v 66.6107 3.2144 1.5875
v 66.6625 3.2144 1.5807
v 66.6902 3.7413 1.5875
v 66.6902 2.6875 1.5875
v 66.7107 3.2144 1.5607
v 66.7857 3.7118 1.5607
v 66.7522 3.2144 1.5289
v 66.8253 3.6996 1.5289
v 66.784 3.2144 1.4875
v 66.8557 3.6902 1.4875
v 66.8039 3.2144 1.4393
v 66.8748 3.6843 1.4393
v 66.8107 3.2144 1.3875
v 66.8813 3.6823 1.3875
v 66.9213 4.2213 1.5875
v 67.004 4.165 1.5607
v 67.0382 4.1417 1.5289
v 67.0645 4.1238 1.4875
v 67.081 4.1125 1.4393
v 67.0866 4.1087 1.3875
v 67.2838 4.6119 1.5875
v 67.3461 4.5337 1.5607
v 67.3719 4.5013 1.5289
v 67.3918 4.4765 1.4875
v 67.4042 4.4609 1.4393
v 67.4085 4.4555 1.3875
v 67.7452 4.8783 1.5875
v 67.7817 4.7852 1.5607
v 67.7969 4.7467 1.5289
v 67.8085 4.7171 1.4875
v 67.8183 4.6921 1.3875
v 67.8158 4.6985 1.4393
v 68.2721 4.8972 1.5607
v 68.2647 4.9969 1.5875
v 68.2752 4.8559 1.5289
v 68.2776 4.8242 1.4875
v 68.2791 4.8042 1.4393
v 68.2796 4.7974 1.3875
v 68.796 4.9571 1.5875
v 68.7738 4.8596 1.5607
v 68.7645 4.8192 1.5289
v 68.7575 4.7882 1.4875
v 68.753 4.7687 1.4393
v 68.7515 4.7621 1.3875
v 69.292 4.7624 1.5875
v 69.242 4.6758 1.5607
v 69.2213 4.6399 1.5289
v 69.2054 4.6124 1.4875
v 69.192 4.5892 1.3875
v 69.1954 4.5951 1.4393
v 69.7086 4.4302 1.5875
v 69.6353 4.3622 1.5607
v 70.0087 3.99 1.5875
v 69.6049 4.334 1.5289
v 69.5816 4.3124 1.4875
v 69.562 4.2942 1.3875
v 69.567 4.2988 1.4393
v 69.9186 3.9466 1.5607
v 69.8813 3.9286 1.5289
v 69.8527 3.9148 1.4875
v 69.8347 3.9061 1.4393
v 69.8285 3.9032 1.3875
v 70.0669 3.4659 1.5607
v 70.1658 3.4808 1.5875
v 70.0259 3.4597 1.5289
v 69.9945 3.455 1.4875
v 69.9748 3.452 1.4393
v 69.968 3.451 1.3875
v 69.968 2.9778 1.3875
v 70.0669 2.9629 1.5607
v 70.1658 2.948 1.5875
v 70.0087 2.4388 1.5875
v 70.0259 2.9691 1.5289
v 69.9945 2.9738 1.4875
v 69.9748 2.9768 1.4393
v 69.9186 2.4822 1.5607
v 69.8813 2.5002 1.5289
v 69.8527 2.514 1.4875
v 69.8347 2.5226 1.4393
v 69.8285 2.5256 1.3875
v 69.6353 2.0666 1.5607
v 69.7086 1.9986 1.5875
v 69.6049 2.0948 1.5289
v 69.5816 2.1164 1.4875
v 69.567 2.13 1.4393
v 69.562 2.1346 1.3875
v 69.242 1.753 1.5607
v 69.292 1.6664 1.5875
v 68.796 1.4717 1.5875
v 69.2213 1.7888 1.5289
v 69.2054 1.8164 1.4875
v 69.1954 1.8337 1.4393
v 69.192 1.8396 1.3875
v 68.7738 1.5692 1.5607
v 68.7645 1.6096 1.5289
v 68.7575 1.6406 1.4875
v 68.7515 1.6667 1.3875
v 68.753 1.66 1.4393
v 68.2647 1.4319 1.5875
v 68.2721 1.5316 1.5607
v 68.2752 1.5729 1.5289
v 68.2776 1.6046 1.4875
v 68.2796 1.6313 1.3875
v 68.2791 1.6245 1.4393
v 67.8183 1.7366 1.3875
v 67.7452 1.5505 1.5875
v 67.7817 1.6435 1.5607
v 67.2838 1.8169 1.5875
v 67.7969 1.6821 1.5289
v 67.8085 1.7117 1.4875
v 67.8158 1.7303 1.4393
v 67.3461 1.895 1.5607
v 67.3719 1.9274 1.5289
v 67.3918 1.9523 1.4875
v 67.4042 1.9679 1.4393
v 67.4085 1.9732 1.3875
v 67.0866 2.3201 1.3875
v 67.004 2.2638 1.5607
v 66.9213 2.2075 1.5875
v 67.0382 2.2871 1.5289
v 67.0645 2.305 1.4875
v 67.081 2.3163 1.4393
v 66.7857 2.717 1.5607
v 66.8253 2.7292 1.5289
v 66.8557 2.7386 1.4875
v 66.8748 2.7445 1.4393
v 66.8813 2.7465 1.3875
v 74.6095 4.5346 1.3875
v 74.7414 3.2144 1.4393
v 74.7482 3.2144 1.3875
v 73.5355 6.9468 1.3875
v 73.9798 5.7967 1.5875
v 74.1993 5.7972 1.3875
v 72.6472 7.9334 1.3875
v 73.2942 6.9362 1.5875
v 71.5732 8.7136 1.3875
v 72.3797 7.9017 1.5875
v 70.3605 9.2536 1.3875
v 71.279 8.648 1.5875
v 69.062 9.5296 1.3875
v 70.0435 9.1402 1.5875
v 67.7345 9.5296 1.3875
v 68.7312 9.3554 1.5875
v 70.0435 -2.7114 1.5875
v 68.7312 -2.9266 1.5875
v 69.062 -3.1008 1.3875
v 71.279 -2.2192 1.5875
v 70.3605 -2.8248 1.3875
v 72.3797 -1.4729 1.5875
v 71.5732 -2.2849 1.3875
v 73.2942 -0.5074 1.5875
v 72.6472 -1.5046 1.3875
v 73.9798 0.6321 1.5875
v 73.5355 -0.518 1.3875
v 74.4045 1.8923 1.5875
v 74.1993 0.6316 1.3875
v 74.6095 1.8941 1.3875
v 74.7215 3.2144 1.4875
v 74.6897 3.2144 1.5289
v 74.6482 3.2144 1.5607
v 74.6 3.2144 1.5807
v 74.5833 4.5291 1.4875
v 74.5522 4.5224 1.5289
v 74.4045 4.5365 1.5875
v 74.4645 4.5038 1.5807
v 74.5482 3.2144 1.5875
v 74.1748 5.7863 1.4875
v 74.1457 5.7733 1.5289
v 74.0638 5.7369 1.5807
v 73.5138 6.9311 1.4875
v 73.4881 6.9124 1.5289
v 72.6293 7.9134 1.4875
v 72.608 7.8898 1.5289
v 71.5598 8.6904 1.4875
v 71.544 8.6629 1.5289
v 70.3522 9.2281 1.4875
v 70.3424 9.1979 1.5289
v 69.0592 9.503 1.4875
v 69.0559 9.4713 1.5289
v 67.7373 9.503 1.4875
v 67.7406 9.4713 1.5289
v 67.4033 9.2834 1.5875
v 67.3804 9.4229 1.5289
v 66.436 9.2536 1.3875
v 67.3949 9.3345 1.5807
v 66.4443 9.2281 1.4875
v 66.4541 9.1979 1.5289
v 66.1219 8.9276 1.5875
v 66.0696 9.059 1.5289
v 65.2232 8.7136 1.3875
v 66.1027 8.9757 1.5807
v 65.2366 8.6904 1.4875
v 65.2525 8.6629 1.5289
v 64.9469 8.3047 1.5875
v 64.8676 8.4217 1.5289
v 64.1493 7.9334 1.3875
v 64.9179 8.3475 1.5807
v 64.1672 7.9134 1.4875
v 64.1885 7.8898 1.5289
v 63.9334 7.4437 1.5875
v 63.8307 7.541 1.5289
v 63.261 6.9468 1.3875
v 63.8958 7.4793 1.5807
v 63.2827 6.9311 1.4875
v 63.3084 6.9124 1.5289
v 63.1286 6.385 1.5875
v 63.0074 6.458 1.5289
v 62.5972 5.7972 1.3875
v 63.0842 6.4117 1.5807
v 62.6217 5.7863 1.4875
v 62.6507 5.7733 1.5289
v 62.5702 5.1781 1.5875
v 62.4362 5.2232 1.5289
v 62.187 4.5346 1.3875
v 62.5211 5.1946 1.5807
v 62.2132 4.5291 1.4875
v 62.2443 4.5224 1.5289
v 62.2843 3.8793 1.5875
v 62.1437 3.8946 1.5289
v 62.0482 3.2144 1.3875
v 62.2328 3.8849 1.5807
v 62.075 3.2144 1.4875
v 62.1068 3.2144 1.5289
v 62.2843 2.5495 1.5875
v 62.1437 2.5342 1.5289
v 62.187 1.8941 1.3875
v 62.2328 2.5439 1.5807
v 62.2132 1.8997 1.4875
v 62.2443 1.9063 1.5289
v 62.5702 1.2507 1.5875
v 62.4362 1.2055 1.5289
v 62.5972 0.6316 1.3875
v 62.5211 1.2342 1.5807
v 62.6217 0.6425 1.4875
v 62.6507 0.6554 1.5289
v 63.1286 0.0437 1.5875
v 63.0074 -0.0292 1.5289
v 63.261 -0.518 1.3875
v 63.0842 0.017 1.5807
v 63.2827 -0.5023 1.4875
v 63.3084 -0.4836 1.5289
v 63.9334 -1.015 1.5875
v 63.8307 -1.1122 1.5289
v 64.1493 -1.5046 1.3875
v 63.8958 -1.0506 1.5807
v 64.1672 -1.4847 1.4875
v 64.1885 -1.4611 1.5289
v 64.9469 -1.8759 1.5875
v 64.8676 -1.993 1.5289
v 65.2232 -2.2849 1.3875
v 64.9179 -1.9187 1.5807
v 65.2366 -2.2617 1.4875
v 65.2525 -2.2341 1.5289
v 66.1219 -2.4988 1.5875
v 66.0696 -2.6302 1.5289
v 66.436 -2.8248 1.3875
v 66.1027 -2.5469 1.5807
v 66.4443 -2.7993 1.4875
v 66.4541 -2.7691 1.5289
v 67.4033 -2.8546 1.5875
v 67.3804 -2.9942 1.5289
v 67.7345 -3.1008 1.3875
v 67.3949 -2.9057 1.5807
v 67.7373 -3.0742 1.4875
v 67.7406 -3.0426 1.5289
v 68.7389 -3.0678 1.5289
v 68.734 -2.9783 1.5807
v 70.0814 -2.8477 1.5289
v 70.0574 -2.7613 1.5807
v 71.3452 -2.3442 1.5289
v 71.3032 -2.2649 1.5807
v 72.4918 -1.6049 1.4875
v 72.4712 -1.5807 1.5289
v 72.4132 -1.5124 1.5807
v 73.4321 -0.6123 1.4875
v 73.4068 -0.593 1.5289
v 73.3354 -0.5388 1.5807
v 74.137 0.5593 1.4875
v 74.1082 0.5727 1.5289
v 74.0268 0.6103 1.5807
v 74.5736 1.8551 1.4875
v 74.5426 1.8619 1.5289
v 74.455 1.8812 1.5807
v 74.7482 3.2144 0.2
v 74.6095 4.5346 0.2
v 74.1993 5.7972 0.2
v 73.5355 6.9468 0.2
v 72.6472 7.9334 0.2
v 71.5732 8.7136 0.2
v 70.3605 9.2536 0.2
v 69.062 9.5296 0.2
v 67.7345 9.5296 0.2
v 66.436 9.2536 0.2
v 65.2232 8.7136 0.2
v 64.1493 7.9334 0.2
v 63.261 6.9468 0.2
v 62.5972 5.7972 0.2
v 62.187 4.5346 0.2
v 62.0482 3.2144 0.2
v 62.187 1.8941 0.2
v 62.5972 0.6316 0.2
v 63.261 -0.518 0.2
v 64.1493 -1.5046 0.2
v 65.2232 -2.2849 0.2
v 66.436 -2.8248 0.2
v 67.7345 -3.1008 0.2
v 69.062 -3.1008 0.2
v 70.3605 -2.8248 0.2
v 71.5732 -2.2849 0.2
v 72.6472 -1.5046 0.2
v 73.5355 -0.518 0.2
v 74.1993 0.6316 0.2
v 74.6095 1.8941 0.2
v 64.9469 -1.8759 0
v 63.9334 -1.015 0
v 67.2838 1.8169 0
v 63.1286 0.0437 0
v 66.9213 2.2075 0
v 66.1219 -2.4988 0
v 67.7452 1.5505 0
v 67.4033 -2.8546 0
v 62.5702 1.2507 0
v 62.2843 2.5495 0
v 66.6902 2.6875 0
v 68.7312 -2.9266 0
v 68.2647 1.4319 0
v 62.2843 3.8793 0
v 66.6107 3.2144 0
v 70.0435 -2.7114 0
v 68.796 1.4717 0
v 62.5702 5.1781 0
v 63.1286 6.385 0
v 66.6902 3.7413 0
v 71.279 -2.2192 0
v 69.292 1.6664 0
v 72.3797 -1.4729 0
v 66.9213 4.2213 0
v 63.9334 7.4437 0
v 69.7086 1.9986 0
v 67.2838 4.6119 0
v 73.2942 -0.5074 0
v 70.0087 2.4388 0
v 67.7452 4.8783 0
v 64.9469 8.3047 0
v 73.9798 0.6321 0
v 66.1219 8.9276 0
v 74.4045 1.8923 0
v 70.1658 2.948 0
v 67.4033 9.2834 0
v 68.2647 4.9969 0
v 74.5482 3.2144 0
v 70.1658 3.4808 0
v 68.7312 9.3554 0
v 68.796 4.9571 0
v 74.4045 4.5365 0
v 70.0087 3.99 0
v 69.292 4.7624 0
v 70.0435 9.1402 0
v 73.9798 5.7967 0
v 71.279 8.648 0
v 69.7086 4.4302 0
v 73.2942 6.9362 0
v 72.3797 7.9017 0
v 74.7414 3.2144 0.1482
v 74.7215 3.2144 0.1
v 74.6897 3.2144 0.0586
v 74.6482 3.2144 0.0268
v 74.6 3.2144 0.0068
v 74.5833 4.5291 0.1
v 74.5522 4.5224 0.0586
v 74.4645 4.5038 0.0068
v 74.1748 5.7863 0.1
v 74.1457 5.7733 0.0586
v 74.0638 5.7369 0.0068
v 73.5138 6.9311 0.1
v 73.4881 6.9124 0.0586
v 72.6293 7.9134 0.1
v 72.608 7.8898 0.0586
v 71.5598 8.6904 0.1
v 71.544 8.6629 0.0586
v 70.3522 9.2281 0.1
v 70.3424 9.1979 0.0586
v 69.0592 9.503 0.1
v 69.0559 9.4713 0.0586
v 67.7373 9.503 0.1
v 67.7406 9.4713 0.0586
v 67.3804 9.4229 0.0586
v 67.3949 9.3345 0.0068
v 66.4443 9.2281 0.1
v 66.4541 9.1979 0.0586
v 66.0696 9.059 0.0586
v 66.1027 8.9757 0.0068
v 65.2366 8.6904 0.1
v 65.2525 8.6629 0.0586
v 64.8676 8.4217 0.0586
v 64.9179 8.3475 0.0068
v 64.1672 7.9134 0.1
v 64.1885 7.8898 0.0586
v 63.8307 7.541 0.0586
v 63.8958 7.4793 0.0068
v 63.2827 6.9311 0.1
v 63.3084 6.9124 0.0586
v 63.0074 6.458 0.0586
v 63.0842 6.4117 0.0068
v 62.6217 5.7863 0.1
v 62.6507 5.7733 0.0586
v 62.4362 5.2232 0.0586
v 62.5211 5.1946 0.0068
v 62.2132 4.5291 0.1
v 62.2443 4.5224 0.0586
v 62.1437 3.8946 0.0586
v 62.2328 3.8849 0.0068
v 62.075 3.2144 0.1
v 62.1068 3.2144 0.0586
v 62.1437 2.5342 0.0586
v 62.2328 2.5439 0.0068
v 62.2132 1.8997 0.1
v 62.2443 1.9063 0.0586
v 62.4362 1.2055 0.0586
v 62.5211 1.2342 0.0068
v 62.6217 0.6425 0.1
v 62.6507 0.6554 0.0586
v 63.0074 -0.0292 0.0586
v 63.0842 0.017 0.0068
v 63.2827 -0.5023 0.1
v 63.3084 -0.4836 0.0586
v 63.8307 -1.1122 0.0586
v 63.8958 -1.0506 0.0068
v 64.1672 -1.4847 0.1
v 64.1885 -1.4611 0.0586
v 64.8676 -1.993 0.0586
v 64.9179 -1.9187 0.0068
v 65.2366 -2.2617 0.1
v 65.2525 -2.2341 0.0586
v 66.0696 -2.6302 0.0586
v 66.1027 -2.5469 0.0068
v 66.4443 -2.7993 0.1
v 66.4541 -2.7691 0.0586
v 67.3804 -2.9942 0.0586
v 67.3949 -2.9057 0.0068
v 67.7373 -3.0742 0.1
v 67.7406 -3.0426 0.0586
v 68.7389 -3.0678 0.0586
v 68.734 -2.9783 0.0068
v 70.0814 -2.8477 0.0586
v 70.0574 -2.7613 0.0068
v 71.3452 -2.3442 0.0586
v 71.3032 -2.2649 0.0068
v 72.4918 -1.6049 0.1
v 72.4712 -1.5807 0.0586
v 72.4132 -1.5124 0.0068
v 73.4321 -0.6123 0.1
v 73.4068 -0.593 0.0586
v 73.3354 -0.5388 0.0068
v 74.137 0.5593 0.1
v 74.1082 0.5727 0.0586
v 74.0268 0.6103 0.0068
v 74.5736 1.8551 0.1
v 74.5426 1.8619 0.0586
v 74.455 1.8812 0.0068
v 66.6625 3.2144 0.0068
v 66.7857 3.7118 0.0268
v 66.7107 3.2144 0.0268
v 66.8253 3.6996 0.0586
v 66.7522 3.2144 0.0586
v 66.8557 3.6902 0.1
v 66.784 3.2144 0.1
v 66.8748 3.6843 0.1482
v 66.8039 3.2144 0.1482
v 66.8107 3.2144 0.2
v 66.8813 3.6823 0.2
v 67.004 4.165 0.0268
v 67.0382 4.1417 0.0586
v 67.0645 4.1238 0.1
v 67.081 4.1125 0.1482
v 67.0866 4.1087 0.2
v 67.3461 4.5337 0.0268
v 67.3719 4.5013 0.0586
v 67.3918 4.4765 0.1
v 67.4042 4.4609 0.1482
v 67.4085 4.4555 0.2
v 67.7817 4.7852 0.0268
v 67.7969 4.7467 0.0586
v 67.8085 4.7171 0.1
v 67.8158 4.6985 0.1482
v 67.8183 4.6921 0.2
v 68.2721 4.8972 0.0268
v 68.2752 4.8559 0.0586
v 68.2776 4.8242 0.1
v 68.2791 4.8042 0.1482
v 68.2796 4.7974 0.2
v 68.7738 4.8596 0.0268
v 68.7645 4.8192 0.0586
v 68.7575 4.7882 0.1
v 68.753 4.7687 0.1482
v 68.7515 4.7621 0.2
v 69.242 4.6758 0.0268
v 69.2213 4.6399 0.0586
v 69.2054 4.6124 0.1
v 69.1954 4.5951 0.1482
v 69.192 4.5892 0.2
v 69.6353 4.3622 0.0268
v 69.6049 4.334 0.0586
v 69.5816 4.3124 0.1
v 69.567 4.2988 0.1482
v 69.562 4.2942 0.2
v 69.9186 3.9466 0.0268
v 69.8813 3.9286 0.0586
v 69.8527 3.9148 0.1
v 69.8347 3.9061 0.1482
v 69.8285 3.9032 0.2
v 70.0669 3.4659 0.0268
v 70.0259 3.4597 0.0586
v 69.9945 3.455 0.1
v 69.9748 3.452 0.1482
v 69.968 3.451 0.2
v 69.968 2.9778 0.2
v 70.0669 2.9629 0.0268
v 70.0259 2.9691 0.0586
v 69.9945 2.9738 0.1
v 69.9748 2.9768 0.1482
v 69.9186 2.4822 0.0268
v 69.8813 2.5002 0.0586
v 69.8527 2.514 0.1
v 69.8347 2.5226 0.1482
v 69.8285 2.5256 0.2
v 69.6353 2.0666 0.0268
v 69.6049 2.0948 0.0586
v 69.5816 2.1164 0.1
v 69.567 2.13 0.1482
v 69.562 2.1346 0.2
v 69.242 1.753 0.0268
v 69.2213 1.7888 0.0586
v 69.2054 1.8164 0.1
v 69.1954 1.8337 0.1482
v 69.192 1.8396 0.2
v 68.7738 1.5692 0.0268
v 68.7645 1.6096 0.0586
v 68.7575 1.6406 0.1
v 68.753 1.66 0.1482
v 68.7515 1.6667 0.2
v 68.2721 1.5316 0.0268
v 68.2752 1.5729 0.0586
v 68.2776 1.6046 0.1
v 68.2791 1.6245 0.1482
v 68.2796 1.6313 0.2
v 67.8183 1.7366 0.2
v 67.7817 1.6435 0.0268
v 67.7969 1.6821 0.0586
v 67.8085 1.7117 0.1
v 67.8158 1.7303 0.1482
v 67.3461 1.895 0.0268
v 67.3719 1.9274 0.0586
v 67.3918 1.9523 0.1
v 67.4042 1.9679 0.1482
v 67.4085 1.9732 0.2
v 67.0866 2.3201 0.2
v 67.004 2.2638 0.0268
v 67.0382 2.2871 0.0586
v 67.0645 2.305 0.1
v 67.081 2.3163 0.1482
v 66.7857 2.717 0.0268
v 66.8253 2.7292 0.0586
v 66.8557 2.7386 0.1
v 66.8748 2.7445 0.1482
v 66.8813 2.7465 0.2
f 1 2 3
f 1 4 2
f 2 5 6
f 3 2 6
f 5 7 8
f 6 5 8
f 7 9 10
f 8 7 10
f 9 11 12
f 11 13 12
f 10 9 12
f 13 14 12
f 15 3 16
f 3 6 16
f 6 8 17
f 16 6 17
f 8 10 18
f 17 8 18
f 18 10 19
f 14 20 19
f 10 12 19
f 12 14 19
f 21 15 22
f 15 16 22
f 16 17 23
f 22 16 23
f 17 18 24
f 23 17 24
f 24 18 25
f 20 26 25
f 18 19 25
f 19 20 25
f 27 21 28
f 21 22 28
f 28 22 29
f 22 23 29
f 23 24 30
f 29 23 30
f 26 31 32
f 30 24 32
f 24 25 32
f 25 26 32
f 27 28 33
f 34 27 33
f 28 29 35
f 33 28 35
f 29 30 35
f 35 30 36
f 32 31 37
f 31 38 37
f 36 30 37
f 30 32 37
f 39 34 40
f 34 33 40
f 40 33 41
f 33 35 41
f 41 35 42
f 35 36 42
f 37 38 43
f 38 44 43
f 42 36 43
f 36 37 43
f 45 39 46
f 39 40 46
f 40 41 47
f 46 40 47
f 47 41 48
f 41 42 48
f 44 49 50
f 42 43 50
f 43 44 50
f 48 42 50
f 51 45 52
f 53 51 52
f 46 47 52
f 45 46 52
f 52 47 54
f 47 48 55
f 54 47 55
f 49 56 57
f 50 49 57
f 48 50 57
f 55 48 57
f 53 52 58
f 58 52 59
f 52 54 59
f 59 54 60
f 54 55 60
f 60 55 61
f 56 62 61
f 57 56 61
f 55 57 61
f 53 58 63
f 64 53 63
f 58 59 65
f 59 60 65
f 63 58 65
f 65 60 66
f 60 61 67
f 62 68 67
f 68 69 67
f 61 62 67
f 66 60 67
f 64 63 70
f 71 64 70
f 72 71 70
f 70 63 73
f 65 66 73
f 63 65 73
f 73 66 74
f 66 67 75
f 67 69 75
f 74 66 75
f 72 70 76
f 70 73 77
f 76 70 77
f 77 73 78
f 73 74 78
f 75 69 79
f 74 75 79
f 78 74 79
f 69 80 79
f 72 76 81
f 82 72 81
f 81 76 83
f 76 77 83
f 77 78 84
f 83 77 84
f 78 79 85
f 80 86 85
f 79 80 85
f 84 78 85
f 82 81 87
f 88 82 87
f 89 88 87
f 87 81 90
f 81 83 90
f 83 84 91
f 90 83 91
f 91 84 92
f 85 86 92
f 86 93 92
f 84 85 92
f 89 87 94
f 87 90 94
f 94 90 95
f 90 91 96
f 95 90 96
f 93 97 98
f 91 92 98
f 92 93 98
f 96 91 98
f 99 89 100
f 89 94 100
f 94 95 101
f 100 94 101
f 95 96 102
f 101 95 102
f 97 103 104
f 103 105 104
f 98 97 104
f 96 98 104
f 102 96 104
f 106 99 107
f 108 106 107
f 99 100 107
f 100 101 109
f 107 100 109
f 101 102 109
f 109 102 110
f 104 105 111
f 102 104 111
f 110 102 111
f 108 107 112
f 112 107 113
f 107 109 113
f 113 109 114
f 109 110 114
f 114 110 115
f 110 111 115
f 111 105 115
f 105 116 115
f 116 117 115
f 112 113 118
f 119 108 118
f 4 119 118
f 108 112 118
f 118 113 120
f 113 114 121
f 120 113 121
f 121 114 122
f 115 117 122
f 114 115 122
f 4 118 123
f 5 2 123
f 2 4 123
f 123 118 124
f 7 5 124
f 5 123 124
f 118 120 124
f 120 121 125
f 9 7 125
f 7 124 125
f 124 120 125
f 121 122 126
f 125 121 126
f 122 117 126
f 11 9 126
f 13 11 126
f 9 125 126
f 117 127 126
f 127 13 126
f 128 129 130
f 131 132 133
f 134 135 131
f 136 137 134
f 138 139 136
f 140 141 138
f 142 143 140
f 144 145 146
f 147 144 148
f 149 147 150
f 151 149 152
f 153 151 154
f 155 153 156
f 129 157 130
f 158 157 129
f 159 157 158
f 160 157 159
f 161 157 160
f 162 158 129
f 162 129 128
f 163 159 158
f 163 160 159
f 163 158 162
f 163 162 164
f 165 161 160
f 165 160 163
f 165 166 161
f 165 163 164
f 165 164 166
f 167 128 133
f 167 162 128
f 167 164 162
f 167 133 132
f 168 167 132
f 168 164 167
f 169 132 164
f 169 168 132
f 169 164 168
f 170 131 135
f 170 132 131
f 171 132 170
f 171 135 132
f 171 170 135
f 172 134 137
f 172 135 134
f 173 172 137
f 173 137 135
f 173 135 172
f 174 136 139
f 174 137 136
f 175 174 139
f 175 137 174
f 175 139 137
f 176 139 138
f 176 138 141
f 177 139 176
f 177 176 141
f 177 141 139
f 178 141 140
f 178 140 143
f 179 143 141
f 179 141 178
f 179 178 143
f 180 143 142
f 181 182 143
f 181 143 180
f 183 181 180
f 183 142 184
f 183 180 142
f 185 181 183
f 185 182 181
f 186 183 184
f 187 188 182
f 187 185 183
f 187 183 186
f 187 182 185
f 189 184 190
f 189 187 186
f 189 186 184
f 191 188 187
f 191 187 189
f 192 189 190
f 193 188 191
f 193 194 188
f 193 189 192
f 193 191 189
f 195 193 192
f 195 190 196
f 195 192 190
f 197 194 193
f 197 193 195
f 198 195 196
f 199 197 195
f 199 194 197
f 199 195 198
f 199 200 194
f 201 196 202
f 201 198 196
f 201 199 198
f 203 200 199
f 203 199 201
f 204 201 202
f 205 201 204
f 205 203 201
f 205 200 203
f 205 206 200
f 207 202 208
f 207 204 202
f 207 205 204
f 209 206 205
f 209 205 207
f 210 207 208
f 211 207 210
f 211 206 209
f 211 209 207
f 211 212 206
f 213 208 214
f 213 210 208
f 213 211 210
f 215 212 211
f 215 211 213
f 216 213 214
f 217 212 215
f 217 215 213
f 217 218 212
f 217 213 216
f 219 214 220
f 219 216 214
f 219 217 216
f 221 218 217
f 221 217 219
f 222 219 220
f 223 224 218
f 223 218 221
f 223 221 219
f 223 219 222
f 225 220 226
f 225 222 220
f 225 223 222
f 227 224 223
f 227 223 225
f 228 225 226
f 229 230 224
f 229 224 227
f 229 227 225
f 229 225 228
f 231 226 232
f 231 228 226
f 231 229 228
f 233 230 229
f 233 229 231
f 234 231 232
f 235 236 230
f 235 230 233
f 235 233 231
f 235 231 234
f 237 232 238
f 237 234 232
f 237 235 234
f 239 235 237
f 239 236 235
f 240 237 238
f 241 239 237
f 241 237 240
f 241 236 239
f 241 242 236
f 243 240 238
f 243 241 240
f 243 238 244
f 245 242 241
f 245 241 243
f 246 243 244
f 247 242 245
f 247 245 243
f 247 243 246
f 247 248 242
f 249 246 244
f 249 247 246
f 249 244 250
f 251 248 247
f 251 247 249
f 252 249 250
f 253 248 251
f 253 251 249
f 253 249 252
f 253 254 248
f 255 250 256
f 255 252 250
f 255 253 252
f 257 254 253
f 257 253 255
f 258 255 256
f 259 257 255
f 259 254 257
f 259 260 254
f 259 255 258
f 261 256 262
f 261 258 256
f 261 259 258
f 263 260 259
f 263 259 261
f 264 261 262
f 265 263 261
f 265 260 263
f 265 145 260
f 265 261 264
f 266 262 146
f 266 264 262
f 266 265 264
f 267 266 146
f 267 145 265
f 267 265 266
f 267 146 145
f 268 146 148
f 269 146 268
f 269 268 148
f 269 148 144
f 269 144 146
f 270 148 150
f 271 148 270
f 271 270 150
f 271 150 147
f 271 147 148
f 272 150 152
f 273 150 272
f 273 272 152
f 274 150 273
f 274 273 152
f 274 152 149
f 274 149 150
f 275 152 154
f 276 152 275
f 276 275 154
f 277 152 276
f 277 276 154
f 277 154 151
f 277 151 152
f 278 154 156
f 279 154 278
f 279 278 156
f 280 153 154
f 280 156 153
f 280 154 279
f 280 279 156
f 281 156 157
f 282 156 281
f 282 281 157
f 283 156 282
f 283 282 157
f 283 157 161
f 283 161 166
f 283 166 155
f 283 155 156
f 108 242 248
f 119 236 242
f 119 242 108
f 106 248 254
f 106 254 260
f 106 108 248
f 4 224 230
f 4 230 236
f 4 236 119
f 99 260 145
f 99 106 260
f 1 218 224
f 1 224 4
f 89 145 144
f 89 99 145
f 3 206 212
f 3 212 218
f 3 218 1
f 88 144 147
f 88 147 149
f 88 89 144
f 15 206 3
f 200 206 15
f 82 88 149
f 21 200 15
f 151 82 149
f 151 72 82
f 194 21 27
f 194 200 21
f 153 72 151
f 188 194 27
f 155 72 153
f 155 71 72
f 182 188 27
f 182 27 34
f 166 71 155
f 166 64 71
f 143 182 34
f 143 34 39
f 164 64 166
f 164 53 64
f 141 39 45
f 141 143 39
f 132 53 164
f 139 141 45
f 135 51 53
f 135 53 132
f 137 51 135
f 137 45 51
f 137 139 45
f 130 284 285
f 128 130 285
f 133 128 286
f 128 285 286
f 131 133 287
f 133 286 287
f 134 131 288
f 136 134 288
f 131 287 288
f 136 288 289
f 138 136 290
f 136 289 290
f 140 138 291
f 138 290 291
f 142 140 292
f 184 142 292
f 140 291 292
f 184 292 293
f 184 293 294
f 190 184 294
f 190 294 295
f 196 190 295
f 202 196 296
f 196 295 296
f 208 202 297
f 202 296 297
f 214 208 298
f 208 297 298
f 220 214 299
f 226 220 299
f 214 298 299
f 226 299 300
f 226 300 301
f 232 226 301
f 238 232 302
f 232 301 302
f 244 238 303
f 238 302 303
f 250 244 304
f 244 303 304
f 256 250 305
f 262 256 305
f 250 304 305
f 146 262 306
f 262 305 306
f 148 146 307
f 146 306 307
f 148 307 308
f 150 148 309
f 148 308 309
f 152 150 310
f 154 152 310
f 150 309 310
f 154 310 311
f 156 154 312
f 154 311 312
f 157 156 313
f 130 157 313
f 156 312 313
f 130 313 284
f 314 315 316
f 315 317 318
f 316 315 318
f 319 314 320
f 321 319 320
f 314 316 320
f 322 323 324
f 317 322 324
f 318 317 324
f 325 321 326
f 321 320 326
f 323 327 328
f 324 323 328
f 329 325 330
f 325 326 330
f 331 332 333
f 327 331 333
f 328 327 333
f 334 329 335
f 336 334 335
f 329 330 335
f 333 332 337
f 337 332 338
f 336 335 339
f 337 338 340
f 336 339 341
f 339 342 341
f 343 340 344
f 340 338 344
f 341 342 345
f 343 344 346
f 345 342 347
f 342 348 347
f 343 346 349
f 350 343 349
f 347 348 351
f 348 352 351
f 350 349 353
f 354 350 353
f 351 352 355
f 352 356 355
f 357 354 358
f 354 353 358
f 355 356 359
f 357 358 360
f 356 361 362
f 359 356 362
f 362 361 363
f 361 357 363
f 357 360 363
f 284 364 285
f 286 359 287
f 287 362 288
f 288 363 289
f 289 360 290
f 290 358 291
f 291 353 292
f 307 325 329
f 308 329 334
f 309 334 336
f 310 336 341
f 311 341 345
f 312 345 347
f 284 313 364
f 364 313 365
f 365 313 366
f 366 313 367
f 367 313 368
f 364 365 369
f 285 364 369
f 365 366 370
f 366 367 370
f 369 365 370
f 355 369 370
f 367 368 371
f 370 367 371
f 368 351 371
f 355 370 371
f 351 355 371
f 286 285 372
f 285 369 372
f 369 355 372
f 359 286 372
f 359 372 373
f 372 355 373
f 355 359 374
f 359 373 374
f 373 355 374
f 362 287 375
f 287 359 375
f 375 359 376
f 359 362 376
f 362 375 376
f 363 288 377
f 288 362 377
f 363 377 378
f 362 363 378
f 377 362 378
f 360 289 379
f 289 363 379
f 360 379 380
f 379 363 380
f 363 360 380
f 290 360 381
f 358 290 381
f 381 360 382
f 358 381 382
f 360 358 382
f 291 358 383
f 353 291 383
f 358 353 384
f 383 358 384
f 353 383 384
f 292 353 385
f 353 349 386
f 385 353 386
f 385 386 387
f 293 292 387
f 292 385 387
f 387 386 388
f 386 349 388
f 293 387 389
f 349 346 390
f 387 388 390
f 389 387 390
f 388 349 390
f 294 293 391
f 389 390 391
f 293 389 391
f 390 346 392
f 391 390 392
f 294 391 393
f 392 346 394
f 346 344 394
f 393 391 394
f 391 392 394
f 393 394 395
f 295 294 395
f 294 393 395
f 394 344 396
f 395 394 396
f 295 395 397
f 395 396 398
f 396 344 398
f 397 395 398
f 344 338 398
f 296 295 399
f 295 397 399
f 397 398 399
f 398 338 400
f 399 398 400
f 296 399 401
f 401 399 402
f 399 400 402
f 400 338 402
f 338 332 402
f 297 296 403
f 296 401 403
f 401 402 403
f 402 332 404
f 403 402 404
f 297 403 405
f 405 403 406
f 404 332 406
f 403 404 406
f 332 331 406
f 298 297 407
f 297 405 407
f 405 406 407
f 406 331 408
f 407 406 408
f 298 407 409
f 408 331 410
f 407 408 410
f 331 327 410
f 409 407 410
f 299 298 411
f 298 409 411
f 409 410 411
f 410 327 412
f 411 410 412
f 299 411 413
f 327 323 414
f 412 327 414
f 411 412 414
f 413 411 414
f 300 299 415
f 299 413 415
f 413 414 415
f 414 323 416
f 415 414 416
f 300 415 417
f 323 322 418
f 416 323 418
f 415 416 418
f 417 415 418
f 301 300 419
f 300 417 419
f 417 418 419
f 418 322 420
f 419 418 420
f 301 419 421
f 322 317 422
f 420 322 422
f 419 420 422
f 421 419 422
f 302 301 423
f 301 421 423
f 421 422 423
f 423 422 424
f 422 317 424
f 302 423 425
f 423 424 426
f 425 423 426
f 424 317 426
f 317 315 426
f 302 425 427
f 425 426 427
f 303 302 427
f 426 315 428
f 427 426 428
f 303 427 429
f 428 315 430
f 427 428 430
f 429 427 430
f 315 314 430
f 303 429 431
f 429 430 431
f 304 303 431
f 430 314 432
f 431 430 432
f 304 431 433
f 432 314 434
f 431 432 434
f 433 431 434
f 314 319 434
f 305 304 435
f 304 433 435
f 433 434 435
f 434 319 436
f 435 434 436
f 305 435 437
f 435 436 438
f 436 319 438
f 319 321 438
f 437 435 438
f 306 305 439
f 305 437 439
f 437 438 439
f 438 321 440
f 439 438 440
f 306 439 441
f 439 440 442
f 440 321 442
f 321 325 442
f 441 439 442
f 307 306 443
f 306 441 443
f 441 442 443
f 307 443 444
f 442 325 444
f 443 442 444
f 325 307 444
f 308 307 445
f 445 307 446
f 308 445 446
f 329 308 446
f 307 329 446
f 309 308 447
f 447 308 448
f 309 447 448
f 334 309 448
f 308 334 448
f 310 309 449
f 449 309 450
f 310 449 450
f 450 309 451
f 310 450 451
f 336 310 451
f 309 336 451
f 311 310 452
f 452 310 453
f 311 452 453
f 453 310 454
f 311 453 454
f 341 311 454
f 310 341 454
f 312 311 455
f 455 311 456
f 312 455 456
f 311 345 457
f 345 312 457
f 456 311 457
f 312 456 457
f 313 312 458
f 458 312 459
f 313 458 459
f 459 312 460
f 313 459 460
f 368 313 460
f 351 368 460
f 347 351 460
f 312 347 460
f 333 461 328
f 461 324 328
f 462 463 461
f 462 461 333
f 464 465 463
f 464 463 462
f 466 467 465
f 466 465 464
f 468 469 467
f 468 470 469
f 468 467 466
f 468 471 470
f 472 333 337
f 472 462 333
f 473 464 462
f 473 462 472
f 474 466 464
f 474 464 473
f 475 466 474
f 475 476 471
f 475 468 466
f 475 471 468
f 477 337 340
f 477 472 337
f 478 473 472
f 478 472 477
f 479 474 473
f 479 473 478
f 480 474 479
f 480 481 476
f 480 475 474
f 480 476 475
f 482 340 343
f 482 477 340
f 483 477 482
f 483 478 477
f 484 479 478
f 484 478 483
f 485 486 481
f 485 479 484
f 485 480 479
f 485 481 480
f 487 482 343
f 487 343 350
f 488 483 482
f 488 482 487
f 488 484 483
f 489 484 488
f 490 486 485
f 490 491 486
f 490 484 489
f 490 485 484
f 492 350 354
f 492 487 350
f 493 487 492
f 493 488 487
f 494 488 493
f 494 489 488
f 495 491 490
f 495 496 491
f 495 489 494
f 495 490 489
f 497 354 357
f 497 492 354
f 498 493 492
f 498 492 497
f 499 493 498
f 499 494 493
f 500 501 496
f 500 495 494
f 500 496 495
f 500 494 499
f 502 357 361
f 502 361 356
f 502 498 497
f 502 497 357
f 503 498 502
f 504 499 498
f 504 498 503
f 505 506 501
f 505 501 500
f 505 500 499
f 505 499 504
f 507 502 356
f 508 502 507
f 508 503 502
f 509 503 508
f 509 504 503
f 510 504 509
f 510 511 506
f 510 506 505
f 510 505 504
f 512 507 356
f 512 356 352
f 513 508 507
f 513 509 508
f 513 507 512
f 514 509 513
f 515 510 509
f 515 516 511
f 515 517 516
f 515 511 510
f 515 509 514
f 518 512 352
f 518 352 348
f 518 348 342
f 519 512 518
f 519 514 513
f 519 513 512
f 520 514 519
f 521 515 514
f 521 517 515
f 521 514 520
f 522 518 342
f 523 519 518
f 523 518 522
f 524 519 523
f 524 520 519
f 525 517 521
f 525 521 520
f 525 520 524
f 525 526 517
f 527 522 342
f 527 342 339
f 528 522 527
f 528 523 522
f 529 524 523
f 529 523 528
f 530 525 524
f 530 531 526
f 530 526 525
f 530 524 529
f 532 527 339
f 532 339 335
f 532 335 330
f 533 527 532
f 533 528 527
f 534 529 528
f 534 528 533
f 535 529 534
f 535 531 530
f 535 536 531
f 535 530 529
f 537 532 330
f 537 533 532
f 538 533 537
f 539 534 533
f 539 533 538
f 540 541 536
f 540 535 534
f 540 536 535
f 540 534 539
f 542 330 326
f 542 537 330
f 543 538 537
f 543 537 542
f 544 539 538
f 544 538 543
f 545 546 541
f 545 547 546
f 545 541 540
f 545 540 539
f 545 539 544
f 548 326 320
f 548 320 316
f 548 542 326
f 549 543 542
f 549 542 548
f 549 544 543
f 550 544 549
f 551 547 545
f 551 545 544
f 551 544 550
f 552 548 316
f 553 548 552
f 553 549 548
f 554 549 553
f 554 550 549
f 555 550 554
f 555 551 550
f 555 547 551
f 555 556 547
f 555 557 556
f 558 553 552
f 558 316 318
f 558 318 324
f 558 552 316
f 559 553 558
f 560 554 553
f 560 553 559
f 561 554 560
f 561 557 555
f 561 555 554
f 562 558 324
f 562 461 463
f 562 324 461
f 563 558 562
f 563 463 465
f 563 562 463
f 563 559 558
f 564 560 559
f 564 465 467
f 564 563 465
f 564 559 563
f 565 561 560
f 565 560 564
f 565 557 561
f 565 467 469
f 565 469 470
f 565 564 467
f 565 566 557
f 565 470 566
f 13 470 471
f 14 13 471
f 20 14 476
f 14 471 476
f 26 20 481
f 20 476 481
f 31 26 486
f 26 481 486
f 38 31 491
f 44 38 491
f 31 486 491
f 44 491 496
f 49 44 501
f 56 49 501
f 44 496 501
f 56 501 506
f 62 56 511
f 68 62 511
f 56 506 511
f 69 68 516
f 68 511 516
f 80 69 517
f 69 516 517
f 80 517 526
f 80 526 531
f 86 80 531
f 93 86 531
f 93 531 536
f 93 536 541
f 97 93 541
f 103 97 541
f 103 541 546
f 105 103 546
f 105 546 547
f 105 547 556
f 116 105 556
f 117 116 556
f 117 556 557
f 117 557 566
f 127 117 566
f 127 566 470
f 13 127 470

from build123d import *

# Parameters (mm, degrees)
SKETCH1_R           = 6.35
BOSS_EXTRUDE1_DEPTH = 1.5875
SKETCH2_R           = 1.5875
CUT_EXTRUDE1_DEPTH  = 76.374385622
FILLET1_R           = 0.2


with BuildPart() as part:
    # Sketch1 → Boss-Extrude1 (new body)
    with BuildSketch(Plane.XY):
        with Locations((68.398246491, 3.214386977)):
            Circle(SKETCH1_R)
    extrude(amount=BOSS_EXTRUDE1_DEPTH)

    # Sketch2 → Cut-Extrude1 (cut, through all)
    with BuildSketch(Plane(origin=(0, 0, 0), x_dir=(-1, 0, 0), z_dir=(0, 0, -1))):
        with Locations((-68.398246491, 3.214386977)):
            Circle(SKETCH2_R)
    extrude(amount=-CUT_EXTRUDE1_DEPTH, mode=Mode.SUBTRACT)

    # Fillet1
    fillet1_edges = [part.edges().sort_by_distance(p)[0] for p in [
        (62.048246491, 3.214386977, 0),
        (62.048246491, 3.214386977, 1.5875),
        (69.985746491, 3.214386977, 1.5875),
        (69.985746491, 3.214386977, 0),
    ]]
    fillet(fillet1_edges, radius=FILLET1_R)


solid = part.part
